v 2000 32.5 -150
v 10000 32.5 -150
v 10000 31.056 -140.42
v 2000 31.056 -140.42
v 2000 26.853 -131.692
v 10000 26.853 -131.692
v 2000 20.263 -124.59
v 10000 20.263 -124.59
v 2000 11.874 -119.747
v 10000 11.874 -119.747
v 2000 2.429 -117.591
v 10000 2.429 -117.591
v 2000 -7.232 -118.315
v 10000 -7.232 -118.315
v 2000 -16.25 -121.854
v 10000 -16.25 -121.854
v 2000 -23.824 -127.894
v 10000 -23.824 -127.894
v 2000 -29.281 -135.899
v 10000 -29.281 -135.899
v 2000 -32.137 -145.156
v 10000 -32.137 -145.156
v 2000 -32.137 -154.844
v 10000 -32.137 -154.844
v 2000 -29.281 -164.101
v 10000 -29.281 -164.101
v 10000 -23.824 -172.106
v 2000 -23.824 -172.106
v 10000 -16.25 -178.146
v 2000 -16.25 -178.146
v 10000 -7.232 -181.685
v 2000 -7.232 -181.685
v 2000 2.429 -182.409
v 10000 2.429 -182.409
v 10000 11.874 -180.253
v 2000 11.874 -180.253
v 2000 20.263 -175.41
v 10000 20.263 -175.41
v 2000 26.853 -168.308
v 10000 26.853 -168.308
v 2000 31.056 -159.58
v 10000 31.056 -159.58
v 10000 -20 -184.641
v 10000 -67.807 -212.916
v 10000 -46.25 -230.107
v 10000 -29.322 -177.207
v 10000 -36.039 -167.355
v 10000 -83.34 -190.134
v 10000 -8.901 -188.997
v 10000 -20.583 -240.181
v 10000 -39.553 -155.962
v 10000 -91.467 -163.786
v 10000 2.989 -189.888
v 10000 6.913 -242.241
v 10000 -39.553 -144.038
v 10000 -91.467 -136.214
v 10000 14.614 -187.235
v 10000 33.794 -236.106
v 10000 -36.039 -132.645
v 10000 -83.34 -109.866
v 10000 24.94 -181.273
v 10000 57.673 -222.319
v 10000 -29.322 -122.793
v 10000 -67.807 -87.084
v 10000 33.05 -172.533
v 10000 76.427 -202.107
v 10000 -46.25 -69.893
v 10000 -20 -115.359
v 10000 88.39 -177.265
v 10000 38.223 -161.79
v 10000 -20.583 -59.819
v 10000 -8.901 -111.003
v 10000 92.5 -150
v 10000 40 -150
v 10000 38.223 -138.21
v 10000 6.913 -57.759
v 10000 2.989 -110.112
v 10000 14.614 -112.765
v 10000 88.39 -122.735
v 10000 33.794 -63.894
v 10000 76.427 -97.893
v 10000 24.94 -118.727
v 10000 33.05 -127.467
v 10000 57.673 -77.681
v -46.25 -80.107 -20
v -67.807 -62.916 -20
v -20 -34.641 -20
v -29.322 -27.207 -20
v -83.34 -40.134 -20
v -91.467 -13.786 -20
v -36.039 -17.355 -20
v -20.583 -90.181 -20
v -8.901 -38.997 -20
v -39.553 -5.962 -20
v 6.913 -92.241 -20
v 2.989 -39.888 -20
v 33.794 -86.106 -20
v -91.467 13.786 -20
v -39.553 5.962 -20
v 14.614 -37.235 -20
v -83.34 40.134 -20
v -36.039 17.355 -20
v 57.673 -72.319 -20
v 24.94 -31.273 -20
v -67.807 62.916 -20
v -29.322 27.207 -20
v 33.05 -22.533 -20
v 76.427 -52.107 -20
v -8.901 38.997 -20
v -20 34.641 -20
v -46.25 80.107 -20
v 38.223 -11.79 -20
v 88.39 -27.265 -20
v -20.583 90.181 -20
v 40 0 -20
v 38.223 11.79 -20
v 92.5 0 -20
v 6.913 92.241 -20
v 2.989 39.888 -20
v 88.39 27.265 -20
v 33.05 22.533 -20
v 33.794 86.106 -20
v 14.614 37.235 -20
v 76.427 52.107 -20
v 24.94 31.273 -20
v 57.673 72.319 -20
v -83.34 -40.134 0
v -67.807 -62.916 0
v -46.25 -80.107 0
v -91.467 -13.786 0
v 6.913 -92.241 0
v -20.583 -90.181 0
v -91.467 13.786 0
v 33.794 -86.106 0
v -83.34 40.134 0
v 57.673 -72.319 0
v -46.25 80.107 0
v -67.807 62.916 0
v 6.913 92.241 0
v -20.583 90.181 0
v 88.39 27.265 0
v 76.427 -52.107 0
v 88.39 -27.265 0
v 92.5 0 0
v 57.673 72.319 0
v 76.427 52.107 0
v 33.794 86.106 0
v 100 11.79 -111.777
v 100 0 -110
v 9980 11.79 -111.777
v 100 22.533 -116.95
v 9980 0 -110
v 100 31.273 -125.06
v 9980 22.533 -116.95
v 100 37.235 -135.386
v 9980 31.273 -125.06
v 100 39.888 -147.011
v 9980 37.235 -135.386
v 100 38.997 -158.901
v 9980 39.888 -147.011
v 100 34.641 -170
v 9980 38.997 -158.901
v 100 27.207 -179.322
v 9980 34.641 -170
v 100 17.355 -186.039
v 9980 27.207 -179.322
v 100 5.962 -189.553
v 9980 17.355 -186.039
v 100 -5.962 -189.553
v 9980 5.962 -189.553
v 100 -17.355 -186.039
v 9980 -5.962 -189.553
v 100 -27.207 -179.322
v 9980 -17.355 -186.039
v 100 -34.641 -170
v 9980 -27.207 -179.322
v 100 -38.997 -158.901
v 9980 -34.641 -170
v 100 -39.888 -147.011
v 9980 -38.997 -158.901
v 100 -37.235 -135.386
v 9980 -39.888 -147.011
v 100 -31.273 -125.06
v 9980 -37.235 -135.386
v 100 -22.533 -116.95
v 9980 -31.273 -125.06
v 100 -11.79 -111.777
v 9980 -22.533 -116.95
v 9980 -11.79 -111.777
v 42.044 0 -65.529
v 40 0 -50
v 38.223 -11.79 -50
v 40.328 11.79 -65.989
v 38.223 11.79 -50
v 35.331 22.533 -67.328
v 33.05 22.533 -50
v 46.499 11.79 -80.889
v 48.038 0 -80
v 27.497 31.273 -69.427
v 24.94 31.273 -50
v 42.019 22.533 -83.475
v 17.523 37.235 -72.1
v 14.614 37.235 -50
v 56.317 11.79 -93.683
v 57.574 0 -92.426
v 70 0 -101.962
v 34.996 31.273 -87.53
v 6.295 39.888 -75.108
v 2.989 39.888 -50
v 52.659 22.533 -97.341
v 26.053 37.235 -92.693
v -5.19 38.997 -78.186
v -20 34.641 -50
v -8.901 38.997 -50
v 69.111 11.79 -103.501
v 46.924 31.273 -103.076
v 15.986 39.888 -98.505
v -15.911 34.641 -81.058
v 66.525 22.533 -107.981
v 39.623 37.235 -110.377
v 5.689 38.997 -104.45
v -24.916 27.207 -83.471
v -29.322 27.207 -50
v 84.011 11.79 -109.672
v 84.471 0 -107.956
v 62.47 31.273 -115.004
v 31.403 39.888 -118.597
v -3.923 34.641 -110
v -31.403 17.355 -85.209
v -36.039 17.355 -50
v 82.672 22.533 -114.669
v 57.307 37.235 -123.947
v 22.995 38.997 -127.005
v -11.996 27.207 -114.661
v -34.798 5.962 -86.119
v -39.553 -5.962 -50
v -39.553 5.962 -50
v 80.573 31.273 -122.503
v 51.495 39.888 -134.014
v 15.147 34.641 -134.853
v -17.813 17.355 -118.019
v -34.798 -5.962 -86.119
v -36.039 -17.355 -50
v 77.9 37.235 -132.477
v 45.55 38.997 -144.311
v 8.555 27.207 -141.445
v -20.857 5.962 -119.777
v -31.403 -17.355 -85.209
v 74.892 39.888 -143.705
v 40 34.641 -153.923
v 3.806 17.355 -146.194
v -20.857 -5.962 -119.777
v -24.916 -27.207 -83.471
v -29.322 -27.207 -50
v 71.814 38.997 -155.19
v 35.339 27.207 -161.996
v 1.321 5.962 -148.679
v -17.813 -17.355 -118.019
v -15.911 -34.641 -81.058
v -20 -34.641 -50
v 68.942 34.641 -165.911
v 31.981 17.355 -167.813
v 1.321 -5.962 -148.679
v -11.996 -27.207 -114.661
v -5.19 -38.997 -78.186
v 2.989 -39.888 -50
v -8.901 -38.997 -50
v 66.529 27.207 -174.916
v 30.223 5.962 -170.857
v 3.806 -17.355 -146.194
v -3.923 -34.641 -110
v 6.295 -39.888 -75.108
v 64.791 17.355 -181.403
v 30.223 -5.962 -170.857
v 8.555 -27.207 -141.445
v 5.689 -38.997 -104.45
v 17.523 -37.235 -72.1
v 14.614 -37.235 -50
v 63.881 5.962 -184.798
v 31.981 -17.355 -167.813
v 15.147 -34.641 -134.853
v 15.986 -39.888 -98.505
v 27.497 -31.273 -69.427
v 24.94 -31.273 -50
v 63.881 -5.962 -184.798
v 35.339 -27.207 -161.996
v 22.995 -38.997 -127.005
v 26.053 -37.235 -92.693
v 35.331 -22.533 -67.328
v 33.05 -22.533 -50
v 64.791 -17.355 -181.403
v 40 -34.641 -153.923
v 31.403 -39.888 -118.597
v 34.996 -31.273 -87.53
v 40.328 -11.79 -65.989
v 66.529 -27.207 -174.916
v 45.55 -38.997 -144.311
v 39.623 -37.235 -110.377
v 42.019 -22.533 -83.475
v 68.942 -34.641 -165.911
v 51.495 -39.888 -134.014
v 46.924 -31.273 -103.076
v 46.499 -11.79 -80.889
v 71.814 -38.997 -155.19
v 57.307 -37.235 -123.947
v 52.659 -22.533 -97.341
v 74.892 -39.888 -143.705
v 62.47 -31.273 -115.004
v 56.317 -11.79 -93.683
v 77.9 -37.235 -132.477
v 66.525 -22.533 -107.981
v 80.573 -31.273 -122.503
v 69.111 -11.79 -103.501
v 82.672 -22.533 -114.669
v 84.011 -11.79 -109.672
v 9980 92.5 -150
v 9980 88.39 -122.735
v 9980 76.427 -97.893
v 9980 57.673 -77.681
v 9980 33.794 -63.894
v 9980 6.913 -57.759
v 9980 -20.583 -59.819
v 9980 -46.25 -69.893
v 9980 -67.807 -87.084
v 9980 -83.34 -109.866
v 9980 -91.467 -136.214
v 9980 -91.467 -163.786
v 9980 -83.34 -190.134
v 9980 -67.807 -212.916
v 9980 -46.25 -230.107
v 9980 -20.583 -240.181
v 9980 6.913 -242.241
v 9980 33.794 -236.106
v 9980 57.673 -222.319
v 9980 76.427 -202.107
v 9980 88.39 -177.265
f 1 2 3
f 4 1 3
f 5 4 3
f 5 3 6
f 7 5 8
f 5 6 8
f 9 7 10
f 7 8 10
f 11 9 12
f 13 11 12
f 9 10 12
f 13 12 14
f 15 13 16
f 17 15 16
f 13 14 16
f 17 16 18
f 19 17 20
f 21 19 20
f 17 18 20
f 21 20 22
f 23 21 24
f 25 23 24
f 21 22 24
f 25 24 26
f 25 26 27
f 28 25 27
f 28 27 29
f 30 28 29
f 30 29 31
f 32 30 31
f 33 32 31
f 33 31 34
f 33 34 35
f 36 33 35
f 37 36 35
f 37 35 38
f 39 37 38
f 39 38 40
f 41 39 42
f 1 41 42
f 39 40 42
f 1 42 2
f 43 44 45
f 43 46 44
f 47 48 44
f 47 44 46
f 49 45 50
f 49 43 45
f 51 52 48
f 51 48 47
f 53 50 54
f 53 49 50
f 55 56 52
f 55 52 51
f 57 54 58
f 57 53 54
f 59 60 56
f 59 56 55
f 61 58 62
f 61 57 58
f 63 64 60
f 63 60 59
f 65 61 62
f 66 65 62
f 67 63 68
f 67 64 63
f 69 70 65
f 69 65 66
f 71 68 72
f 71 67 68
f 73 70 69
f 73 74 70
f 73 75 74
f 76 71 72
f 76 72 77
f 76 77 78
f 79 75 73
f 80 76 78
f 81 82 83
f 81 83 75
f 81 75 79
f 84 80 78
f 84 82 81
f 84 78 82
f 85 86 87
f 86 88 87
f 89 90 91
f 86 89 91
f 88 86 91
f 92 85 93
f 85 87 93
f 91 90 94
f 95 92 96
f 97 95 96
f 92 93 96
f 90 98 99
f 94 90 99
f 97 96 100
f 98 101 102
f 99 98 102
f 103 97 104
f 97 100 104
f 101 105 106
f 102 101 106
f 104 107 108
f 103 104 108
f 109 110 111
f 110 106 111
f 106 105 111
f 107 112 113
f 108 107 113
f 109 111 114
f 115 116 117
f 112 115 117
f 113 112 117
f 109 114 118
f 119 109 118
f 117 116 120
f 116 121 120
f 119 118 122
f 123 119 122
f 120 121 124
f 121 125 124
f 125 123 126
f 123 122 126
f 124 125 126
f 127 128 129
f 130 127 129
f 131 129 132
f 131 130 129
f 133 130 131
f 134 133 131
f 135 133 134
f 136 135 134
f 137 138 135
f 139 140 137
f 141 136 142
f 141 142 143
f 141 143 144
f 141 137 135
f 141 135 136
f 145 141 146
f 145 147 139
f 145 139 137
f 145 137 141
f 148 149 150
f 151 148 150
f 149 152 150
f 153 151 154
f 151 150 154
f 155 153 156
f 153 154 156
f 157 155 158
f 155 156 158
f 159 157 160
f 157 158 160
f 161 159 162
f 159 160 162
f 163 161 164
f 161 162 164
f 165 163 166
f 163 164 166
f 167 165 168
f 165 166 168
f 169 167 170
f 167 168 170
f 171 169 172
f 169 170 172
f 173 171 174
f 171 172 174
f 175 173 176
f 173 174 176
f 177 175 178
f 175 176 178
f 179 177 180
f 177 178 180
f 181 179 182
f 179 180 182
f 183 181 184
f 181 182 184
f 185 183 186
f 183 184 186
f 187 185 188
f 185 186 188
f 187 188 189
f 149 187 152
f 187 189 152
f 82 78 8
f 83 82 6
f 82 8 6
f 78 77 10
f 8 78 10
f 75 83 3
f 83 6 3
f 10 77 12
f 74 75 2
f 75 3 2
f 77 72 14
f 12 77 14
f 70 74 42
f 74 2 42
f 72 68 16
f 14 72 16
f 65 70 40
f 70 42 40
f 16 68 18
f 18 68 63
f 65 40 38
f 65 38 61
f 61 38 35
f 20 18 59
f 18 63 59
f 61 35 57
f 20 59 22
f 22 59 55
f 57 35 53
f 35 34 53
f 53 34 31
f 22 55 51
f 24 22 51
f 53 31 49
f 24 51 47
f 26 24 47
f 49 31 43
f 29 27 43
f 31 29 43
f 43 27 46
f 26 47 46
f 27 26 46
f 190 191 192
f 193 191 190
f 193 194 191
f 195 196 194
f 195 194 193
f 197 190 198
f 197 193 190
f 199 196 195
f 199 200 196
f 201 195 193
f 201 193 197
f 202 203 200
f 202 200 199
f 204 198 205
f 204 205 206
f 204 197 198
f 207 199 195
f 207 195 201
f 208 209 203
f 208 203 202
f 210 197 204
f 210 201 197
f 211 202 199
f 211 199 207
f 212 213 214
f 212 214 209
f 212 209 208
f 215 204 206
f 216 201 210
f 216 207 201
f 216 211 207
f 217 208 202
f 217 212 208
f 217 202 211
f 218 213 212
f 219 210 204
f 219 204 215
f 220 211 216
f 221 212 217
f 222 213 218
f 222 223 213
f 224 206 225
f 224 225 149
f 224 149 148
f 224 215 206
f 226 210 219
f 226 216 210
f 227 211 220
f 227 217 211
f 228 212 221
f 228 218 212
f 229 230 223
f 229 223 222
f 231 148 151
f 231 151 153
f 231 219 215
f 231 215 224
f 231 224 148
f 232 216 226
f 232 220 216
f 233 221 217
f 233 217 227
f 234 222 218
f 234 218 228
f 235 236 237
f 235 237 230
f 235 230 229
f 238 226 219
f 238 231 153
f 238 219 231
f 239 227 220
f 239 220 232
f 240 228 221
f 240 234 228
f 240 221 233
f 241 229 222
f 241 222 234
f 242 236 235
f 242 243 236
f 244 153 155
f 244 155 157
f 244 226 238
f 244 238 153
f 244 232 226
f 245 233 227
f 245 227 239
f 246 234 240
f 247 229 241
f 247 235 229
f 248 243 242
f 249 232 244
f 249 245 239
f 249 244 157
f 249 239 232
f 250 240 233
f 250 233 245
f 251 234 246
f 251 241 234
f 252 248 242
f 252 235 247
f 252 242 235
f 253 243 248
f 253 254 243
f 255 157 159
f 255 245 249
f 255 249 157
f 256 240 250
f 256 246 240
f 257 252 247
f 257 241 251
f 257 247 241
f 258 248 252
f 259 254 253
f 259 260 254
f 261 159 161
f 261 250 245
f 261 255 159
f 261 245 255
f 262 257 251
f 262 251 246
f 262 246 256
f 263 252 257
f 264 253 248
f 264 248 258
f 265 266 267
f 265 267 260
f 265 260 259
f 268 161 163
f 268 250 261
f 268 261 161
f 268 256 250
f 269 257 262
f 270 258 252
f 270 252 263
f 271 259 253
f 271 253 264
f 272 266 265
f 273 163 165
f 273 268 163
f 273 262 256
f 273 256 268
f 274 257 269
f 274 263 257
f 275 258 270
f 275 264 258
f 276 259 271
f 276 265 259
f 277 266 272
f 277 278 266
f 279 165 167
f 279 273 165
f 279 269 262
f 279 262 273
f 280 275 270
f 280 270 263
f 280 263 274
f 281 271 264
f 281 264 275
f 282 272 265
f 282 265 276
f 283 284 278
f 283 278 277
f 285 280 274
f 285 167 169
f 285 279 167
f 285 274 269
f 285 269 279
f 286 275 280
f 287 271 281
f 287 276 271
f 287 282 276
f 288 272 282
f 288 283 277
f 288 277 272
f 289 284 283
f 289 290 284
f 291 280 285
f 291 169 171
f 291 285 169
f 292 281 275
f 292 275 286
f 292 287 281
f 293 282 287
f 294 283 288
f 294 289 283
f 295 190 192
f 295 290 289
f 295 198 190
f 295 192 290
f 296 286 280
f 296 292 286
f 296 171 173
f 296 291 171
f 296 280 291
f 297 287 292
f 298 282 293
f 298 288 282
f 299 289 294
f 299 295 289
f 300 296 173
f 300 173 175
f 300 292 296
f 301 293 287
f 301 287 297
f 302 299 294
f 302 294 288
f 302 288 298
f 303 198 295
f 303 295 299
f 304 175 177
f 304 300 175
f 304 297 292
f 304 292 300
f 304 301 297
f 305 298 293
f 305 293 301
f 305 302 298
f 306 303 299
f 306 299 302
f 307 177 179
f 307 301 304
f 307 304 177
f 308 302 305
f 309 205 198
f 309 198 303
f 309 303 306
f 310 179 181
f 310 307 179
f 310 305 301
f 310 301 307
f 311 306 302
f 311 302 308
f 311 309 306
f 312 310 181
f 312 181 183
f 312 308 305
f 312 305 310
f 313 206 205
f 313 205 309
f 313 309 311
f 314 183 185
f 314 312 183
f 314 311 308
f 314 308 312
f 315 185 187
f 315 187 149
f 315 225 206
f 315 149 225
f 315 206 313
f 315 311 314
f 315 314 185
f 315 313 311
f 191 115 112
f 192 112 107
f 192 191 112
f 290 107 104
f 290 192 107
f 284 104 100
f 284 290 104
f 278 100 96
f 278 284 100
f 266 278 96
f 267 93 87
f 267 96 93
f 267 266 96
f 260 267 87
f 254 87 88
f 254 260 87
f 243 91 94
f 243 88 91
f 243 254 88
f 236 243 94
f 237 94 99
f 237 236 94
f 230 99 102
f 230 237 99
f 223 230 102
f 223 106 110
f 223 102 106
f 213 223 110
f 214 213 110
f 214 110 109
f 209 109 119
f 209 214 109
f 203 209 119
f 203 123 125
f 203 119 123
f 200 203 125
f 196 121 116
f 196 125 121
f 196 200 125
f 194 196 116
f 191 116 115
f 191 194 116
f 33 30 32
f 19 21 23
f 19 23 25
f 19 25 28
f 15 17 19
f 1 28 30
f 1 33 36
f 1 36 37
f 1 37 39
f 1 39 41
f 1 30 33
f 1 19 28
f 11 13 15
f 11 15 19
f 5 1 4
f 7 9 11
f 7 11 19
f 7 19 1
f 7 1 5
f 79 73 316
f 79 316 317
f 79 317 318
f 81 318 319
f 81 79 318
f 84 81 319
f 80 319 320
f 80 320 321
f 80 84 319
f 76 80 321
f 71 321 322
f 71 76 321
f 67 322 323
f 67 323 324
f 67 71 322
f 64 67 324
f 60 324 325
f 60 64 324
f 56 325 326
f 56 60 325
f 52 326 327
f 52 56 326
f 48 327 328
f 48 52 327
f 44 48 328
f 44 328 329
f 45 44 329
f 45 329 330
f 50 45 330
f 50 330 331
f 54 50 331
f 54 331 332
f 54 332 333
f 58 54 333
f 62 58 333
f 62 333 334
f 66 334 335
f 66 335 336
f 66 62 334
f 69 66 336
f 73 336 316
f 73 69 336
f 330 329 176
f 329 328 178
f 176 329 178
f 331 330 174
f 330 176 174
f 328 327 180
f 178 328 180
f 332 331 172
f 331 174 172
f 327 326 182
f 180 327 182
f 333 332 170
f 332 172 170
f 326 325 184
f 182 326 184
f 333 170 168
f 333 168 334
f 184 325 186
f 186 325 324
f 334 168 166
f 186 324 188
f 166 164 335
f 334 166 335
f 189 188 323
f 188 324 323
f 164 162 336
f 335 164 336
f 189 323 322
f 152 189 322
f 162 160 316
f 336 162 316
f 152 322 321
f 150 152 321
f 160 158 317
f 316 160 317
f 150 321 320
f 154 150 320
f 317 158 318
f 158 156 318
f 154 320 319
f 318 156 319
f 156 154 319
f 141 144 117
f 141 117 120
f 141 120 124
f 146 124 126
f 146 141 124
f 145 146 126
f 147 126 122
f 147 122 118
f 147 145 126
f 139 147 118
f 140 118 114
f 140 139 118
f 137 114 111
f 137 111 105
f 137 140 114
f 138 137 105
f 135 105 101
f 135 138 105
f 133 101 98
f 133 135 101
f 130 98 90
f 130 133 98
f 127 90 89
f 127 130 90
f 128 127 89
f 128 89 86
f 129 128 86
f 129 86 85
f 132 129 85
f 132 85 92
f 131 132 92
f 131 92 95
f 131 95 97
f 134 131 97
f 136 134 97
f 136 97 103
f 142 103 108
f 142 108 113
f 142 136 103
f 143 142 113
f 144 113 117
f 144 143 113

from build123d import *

# Parameters (mm, degrees)
F1_R     = 92.5
F1_R_2   = 40
F2_DEPTH = 20
F4_R     = 92.5
F4_R_2   = 40
F5_DEPTH = 20
F6_R     = 32.5
F7_DEPTH = 8000


with BuildPart() as f2:
    # F1 (on Top) → F2 (new body)
    with BuildSketch(Plane.XY):
        Circle(F1_R)
        Circle(F1_R_2, mode=Mode.SUBTRACT)
    extrude(amount=-F2_DEPTH)

    # F3: sweep along a path in F0
    with BuildLine(Plane.XZ) as f3_path:
        Line((0, 0), (0, -50))
        ThreePointArc((0, -50), (29.2893218813, -120.7106781187), (100, -150))
        Line((100, -150), (10000, -150))
    # F1 (on Top) → F3 (sweep)
    with BuildSketch(Plane.XY):
        Circle(F1_R_2)
    sweep(path=f3_path.line)

    # F4 (on face) → F5 (join)
    with BuildSketch(Plane.YZ.offset(10000)):
        with Locations((0, -150)):
            Circle(F4_R)
        with Locations((0, -150)):
            Circle(F4_R_2, mode=Mode.SUBTRACT)
    extrude(amount=-F5_DEPTH)

    # F6 (on face) → F7 (cut)
    with BuildSketch(Plane.YZ.offset(10000)):
        with Locations((0, -150)):
            Circle(F6_R)
    extrude(amount=-F7_DEPTH, mode=Mode.SUBTRACT)


solid = f2.part
